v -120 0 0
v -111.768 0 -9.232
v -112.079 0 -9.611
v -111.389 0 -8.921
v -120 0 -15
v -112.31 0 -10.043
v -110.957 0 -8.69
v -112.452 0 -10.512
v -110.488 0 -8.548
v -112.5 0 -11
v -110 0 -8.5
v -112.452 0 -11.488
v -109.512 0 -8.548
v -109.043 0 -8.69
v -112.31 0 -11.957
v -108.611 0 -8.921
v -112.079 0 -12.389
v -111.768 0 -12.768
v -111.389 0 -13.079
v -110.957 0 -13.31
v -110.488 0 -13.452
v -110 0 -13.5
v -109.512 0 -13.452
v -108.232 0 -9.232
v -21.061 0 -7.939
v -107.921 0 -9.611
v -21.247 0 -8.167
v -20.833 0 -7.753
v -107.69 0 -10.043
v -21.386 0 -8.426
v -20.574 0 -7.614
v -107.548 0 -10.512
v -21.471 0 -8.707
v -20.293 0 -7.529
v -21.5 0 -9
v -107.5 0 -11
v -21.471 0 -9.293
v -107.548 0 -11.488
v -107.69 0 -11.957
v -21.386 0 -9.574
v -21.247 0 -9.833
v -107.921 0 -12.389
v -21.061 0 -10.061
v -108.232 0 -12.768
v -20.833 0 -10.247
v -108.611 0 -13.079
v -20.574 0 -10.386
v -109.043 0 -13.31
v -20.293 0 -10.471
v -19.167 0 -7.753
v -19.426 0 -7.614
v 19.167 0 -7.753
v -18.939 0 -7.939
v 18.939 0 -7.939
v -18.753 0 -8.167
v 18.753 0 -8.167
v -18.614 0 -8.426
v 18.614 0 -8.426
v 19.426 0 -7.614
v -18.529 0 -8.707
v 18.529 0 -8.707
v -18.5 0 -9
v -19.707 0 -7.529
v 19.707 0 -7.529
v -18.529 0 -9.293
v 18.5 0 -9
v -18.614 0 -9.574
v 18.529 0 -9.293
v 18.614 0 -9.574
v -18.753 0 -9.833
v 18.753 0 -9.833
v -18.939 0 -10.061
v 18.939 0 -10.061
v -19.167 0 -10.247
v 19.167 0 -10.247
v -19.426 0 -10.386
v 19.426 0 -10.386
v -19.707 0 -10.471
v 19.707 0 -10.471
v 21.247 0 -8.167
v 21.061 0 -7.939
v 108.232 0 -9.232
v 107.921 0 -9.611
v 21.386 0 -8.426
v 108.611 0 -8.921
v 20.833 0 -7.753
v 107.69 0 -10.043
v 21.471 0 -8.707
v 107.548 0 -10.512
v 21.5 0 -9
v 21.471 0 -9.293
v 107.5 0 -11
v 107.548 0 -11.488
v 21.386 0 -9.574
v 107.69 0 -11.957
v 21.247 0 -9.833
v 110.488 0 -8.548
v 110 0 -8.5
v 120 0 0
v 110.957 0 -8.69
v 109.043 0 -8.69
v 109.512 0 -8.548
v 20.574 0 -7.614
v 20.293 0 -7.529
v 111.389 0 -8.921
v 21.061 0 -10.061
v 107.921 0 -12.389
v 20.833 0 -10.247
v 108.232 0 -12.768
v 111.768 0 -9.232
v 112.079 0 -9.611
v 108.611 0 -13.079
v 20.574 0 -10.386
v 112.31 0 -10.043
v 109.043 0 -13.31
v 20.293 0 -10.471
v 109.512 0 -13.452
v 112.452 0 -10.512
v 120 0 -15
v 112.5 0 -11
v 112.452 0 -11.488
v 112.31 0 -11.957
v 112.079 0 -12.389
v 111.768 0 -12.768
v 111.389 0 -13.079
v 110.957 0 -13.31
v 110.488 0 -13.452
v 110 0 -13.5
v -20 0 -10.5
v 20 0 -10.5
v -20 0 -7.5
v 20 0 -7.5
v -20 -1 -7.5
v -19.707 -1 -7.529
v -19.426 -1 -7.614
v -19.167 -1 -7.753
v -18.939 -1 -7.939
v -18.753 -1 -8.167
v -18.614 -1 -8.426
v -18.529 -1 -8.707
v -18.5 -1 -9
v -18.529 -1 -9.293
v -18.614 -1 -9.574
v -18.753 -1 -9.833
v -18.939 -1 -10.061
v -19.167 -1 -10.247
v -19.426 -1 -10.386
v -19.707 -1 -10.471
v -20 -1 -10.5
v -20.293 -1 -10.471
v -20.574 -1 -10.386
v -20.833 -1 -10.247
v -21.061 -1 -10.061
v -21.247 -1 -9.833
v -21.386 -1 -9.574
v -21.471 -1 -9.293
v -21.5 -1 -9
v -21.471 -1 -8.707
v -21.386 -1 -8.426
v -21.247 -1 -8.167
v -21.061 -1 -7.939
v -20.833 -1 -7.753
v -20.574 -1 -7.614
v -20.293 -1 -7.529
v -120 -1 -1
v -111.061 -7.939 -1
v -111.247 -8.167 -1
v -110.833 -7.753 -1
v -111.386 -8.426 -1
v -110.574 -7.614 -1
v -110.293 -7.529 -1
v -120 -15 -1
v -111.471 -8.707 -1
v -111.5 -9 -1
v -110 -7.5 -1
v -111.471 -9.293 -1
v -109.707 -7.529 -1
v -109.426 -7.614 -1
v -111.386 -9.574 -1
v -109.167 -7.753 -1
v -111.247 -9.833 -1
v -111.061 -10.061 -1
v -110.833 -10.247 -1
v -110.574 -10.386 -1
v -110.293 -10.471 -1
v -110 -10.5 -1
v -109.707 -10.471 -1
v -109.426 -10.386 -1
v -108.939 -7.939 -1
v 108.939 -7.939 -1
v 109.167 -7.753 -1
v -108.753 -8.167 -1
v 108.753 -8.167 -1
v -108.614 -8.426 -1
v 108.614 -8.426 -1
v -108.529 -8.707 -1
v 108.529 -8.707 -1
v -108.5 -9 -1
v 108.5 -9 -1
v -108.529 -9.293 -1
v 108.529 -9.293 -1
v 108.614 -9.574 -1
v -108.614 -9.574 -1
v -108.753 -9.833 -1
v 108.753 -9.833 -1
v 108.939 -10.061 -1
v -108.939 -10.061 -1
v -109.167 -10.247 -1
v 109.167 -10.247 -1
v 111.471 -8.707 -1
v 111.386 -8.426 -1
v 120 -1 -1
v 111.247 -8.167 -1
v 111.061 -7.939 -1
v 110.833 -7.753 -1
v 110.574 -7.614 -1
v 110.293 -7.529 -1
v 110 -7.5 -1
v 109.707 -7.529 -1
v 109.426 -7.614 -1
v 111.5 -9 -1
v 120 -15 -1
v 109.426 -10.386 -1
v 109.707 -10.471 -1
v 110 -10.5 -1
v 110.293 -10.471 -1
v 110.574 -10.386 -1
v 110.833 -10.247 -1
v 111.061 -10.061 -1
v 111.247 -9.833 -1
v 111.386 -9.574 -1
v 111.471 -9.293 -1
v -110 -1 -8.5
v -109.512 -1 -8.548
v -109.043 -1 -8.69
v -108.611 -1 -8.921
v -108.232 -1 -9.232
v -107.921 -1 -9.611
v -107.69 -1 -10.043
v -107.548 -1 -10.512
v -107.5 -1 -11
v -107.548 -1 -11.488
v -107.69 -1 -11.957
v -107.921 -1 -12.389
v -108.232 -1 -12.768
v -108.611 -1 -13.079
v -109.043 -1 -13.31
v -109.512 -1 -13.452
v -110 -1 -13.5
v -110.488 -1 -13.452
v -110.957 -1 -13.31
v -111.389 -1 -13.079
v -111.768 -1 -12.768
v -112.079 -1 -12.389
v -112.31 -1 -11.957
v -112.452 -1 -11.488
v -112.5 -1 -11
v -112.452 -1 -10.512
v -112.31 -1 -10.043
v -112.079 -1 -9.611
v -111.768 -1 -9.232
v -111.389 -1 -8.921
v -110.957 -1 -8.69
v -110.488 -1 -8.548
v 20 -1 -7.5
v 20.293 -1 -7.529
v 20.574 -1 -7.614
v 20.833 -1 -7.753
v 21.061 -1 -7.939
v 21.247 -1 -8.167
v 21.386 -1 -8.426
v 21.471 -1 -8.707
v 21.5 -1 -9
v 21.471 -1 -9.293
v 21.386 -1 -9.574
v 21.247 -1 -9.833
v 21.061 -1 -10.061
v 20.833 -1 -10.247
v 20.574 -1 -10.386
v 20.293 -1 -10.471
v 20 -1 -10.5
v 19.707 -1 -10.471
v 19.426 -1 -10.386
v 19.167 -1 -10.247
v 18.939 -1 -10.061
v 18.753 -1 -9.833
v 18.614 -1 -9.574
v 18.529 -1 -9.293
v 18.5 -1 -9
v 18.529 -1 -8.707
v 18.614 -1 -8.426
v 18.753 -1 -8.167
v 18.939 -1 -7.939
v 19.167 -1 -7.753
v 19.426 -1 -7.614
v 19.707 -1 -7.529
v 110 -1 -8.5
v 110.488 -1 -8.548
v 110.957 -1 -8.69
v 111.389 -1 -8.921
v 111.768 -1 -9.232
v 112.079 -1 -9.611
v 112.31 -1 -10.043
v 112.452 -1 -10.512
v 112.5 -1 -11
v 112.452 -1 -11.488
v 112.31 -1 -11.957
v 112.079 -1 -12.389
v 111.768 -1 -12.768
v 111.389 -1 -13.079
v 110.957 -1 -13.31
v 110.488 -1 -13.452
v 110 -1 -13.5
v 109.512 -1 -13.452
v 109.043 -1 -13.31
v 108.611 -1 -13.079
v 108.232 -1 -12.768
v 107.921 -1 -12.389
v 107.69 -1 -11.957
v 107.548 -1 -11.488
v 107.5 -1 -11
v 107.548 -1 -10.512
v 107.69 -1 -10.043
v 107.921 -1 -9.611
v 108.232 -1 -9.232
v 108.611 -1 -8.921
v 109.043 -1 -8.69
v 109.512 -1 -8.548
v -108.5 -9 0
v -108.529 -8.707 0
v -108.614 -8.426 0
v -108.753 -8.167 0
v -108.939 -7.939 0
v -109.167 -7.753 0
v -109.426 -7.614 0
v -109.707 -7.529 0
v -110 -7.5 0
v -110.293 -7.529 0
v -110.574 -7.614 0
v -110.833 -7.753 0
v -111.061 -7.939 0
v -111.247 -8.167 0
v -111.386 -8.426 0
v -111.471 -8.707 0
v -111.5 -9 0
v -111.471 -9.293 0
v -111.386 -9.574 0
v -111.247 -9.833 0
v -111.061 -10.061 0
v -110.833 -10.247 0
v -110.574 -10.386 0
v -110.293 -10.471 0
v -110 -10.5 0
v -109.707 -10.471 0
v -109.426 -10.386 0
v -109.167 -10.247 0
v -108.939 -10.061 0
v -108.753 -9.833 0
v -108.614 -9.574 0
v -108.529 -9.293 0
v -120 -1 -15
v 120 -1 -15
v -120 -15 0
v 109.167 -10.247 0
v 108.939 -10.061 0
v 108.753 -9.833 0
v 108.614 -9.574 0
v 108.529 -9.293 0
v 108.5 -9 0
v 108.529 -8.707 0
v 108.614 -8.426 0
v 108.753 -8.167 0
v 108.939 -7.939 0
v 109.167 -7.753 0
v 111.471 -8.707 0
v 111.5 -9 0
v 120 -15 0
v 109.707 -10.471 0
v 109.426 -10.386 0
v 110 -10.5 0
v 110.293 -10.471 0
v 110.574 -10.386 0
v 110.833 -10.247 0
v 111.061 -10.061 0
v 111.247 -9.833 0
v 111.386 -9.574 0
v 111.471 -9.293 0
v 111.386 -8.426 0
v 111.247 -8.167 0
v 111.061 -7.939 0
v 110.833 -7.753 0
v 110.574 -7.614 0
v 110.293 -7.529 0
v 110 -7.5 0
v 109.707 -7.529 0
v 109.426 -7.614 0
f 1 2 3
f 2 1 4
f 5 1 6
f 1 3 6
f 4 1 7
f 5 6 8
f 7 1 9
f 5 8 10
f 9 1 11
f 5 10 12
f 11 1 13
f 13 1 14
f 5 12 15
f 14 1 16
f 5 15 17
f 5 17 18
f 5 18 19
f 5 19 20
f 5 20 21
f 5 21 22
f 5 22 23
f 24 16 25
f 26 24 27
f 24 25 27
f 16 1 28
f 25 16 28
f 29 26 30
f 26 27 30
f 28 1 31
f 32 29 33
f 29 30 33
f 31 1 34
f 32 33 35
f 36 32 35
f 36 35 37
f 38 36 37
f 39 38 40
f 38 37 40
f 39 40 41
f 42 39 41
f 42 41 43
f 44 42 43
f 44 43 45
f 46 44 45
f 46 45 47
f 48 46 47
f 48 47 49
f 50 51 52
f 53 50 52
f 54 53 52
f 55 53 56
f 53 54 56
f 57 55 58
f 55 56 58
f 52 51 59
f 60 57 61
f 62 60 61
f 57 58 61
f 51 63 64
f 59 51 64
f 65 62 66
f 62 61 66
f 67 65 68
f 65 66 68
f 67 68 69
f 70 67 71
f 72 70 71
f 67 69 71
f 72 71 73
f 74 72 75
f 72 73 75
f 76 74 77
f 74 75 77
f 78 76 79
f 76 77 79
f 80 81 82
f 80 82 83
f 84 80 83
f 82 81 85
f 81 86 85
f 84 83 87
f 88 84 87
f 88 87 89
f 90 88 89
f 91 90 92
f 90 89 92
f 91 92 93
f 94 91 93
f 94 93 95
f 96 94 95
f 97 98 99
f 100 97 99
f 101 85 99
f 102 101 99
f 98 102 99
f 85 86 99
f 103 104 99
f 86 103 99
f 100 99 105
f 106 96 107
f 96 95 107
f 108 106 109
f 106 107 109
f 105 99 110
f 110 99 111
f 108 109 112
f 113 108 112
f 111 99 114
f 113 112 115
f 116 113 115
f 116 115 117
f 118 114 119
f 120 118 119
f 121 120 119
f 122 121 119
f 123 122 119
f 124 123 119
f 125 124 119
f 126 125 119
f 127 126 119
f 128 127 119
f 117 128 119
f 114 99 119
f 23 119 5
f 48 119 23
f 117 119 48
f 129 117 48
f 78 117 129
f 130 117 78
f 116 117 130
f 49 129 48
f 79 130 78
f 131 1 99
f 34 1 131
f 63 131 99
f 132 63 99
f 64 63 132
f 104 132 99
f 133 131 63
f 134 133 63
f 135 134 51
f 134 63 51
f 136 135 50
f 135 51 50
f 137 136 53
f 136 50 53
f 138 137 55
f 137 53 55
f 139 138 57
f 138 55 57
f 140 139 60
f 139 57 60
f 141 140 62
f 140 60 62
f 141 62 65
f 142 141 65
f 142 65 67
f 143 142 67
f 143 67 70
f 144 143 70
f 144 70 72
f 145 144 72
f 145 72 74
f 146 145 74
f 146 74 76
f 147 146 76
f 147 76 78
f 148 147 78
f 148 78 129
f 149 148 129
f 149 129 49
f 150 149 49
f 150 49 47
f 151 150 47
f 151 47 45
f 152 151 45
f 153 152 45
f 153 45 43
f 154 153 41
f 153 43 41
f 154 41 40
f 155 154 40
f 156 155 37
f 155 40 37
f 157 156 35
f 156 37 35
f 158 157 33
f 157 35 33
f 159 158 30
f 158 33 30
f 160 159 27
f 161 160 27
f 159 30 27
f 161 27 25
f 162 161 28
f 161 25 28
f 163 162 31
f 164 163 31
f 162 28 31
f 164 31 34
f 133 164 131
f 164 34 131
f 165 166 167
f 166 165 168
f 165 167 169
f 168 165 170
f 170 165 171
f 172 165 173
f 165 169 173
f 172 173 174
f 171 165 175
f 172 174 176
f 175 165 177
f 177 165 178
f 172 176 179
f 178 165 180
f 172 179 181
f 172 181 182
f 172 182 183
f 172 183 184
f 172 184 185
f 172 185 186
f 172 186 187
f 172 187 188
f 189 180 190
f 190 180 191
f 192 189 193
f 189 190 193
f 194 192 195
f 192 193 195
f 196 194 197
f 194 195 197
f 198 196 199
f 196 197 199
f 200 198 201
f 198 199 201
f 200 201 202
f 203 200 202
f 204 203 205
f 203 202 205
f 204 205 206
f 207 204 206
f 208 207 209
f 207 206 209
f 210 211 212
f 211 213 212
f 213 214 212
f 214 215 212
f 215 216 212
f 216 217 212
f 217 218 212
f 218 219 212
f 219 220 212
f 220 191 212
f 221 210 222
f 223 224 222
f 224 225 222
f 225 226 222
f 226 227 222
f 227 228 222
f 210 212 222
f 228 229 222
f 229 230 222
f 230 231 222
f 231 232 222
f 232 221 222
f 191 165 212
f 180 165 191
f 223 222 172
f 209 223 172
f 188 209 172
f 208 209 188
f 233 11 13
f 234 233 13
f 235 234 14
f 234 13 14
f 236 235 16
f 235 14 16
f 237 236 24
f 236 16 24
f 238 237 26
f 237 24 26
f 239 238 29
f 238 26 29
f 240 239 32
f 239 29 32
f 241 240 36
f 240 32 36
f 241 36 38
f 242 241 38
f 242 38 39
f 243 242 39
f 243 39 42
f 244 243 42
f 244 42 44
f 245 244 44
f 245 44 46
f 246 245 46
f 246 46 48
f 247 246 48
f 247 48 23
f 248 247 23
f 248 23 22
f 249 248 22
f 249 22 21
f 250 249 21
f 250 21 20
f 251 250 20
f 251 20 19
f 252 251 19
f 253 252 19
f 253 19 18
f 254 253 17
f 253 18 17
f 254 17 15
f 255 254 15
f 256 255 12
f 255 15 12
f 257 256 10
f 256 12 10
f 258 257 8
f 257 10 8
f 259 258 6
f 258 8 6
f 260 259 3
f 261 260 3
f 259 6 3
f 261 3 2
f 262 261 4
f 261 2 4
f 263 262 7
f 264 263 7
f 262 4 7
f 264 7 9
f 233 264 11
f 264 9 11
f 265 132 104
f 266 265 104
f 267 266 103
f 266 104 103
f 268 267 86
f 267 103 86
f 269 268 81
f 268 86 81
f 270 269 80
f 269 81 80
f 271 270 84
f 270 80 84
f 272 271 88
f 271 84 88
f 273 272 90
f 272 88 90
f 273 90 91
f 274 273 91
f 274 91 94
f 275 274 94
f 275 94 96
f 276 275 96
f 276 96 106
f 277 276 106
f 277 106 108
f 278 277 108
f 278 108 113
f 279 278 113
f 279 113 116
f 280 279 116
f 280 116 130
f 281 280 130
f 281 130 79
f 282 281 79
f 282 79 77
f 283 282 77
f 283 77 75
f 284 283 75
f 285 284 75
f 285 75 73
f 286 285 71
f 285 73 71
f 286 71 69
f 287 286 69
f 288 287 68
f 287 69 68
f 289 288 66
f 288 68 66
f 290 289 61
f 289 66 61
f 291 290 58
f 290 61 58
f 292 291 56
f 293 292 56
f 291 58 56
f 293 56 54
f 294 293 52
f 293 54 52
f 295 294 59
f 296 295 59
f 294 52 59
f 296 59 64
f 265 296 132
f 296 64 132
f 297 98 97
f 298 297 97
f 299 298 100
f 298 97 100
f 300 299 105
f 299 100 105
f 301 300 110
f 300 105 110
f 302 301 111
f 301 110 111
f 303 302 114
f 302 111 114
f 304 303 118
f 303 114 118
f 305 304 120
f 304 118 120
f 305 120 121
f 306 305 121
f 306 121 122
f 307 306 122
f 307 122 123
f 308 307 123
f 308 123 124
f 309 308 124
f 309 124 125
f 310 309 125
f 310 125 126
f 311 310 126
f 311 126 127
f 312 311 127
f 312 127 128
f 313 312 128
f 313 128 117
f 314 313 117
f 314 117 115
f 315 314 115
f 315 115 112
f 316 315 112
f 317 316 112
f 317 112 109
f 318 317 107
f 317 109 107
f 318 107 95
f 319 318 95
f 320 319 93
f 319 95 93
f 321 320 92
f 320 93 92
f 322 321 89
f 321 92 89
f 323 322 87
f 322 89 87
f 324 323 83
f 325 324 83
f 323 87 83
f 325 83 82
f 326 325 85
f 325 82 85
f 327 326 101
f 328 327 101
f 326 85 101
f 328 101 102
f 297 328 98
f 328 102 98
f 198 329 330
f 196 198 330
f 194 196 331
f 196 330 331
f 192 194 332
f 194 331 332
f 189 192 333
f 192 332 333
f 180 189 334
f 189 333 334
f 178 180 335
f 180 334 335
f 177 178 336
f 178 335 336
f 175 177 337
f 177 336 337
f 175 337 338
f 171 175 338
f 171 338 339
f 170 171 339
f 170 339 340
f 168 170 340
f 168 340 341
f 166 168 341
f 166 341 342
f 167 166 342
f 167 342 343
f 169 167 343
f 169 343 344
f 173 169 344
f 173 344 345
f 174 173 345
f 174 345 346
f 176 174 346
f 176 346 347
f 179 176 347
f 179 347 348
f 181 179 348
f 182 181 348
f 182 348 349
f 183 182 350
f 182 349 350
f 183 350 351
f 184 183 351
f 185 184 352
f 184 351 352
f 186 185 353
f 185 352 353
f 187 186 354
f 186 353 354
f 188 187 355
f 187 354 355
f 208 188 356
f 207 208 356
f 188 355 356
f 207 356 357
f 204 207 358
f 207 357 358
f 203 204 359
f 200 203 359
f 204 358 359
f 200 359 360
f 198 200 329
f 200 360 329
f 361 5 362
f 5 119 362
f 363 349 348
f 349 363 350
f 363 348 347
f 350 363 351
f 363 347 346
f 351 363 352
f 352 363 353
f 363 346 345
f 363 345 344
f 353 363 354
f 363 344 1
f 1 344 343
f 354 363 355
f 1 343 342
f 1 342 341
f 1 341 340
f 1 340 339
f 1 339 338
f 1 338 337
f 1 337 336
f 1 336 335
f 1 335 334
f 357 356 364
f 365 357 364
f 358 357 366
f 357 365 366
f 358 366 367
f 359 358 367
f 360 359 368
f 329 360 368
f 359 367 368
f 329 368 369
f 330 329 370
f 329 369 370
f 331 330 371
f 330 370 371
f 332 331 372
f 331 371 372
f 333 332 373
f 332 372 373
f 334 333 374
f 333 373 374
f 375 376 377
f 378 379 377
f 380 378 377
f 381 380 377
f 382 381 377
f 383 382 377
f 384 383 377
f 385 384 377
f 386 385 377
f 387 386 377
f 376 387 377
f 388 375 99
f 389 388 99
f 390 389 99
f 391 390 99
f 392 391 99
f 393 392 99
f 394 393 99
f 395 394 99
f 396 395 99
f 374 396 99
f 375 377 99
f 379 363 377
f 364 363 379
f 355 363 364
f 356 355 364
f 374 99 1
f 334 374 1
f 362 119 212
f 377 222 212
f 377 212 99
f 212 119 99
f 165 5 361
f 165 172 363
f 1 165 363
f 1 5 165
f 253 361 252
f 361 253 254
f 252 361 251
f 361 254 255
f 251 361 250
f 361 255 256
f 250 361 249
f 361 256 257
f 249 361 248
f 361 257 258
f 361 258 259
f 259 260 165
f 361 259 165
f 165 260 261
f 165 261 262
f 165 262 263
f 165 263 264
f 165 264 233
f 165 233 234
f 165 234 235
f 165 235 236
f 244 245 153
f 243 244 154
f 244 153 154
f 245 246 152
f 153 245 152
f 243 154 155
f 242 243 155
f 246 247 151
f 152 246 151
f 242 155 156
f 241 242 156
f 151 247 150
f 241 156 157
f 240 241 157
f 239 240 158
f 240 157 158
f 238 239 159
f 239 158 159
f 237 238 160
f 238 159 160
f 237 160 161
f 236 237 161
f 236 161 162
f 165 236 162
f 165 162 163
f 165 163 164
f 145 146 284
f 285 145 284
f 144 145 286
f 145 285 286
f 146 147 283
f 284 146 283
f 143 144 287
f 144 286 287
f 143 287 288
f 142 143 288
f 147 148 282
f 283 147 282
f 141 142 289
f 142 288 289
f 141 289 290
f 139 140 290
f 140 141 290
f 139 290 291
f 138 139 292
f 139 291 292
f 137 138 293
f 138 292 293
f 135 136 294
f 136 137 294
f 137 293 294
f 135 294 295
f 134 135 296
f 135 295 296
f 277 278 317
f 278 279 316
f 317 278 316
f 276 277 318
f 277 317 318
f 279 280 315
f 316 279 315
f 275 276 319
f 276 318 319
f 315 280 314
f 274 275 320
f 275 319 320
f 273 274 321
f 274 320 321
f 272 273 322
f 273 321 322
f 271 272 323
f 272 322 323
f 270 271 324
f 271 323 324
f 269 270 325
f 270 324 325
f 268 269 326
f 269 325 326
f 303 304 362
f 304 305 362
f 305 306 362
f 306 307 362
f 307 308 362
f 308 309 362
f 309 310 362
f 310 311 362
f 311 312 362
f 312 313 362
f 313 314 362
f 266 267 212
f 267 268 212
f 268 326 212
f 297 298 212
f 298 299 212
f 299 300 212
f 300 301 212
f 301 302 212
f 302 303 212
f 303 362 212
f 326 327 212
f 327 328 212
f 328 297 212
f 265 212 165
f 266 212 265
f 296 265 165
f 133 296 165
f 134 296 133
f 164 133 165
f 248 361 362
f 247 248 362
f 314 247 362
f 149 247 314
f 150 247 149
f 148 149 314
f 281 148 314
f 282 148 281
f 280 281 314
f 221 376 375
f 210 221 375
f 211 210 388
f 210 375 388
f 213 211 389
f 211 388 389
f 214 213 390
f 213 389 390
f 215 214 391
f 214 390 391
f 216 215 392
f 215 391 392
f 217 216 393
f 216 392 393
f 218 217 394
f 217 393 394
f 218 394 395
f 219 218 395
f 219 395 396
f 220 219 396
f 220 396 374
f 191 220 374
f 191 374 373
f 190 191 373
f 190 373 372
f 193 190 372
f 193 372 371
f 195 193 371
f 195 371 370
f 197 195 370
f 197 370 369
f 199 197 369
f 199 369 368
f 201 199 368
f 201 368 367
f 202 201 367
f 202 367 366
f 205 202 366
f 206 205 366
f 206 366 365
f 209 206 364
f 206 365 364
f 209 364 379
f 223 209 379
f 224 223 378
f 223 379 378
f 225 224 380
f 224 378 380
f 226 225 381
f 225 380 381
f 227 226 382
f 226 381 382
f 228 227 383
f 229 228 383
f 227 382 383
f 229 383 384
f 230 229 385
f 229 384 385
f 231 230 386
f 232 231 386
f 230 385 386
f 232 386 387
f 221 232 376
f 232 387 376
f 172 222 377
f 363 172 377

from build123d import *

# Parameters (mm, degrees)
EXTRU_MINCE1_DEPTH      = 120
ESQUISSE2_R             = 1.5
ENL_V_MAT_EXTRU_1_DEPTH = 3
ESQUISSE3_R             = 2.5
ESQUISSE3_R_2           = 1.5
ENL_V_MAT_EXTRU_2_DEPTH = 3


with BuildPart() as part:
    # Esquisse1 → Extru.-Mince1 (new, symmetric)
    with BuildSketch(Plane(origin=(0, 0, 0), x_dir=(0, 0, -1), z_dir=(1, 0, 0))):
        Polygon((0, -15), (0, 0), (15, 0), (15, -1), (1, -1), (1, -15), align=None)
    extrude(amount=EXTRU_MINCE1_DEPTH, both=True)

    # Esquisse2 → Enlèv. mat.-Extru.1 (cut)
    with BuildSketch(Plane.XY):
        with Locations((-110, -9)):
            Circle(ESQUISSE2_R)
        with Locations((110, -9)):
            Circle(ESQUISSE2_R)
    extrude(amount=-ENL_V_MAT_EXTRU_1_DEPTH, mode=Mode.SUBTRACT)

    # Esquisse3 → Enlèv. mat.-Extru.2 (cut)
    with BuildSketch(Plane(origin=(0, 0, 0), x_dir=(1, 0, 0), z_dir=(0, 1, 0))):
        with Locations(Location((-110, 11, 0), (0, 0, 270))):
            Circle(ESQUISSE3_R)
        with Locations(Location((-20, 9, 0), (0, 0, 270))):
            Circle(ESQUISSE3_R_2)
        with Locations(Location((110, 11, 0), (0, 0, 270))):
            Circle(ESQUISSE3_R)
        with Locations(Location((20, 9, 0), (0, 0, 270))):
            Circle(ESQUISSE3_R_2)
    extrude(amount=-ENL_V_MAT_EXTRU_2_DEPTH, mode=Mode.SUBTRACT)


solid = part.part
